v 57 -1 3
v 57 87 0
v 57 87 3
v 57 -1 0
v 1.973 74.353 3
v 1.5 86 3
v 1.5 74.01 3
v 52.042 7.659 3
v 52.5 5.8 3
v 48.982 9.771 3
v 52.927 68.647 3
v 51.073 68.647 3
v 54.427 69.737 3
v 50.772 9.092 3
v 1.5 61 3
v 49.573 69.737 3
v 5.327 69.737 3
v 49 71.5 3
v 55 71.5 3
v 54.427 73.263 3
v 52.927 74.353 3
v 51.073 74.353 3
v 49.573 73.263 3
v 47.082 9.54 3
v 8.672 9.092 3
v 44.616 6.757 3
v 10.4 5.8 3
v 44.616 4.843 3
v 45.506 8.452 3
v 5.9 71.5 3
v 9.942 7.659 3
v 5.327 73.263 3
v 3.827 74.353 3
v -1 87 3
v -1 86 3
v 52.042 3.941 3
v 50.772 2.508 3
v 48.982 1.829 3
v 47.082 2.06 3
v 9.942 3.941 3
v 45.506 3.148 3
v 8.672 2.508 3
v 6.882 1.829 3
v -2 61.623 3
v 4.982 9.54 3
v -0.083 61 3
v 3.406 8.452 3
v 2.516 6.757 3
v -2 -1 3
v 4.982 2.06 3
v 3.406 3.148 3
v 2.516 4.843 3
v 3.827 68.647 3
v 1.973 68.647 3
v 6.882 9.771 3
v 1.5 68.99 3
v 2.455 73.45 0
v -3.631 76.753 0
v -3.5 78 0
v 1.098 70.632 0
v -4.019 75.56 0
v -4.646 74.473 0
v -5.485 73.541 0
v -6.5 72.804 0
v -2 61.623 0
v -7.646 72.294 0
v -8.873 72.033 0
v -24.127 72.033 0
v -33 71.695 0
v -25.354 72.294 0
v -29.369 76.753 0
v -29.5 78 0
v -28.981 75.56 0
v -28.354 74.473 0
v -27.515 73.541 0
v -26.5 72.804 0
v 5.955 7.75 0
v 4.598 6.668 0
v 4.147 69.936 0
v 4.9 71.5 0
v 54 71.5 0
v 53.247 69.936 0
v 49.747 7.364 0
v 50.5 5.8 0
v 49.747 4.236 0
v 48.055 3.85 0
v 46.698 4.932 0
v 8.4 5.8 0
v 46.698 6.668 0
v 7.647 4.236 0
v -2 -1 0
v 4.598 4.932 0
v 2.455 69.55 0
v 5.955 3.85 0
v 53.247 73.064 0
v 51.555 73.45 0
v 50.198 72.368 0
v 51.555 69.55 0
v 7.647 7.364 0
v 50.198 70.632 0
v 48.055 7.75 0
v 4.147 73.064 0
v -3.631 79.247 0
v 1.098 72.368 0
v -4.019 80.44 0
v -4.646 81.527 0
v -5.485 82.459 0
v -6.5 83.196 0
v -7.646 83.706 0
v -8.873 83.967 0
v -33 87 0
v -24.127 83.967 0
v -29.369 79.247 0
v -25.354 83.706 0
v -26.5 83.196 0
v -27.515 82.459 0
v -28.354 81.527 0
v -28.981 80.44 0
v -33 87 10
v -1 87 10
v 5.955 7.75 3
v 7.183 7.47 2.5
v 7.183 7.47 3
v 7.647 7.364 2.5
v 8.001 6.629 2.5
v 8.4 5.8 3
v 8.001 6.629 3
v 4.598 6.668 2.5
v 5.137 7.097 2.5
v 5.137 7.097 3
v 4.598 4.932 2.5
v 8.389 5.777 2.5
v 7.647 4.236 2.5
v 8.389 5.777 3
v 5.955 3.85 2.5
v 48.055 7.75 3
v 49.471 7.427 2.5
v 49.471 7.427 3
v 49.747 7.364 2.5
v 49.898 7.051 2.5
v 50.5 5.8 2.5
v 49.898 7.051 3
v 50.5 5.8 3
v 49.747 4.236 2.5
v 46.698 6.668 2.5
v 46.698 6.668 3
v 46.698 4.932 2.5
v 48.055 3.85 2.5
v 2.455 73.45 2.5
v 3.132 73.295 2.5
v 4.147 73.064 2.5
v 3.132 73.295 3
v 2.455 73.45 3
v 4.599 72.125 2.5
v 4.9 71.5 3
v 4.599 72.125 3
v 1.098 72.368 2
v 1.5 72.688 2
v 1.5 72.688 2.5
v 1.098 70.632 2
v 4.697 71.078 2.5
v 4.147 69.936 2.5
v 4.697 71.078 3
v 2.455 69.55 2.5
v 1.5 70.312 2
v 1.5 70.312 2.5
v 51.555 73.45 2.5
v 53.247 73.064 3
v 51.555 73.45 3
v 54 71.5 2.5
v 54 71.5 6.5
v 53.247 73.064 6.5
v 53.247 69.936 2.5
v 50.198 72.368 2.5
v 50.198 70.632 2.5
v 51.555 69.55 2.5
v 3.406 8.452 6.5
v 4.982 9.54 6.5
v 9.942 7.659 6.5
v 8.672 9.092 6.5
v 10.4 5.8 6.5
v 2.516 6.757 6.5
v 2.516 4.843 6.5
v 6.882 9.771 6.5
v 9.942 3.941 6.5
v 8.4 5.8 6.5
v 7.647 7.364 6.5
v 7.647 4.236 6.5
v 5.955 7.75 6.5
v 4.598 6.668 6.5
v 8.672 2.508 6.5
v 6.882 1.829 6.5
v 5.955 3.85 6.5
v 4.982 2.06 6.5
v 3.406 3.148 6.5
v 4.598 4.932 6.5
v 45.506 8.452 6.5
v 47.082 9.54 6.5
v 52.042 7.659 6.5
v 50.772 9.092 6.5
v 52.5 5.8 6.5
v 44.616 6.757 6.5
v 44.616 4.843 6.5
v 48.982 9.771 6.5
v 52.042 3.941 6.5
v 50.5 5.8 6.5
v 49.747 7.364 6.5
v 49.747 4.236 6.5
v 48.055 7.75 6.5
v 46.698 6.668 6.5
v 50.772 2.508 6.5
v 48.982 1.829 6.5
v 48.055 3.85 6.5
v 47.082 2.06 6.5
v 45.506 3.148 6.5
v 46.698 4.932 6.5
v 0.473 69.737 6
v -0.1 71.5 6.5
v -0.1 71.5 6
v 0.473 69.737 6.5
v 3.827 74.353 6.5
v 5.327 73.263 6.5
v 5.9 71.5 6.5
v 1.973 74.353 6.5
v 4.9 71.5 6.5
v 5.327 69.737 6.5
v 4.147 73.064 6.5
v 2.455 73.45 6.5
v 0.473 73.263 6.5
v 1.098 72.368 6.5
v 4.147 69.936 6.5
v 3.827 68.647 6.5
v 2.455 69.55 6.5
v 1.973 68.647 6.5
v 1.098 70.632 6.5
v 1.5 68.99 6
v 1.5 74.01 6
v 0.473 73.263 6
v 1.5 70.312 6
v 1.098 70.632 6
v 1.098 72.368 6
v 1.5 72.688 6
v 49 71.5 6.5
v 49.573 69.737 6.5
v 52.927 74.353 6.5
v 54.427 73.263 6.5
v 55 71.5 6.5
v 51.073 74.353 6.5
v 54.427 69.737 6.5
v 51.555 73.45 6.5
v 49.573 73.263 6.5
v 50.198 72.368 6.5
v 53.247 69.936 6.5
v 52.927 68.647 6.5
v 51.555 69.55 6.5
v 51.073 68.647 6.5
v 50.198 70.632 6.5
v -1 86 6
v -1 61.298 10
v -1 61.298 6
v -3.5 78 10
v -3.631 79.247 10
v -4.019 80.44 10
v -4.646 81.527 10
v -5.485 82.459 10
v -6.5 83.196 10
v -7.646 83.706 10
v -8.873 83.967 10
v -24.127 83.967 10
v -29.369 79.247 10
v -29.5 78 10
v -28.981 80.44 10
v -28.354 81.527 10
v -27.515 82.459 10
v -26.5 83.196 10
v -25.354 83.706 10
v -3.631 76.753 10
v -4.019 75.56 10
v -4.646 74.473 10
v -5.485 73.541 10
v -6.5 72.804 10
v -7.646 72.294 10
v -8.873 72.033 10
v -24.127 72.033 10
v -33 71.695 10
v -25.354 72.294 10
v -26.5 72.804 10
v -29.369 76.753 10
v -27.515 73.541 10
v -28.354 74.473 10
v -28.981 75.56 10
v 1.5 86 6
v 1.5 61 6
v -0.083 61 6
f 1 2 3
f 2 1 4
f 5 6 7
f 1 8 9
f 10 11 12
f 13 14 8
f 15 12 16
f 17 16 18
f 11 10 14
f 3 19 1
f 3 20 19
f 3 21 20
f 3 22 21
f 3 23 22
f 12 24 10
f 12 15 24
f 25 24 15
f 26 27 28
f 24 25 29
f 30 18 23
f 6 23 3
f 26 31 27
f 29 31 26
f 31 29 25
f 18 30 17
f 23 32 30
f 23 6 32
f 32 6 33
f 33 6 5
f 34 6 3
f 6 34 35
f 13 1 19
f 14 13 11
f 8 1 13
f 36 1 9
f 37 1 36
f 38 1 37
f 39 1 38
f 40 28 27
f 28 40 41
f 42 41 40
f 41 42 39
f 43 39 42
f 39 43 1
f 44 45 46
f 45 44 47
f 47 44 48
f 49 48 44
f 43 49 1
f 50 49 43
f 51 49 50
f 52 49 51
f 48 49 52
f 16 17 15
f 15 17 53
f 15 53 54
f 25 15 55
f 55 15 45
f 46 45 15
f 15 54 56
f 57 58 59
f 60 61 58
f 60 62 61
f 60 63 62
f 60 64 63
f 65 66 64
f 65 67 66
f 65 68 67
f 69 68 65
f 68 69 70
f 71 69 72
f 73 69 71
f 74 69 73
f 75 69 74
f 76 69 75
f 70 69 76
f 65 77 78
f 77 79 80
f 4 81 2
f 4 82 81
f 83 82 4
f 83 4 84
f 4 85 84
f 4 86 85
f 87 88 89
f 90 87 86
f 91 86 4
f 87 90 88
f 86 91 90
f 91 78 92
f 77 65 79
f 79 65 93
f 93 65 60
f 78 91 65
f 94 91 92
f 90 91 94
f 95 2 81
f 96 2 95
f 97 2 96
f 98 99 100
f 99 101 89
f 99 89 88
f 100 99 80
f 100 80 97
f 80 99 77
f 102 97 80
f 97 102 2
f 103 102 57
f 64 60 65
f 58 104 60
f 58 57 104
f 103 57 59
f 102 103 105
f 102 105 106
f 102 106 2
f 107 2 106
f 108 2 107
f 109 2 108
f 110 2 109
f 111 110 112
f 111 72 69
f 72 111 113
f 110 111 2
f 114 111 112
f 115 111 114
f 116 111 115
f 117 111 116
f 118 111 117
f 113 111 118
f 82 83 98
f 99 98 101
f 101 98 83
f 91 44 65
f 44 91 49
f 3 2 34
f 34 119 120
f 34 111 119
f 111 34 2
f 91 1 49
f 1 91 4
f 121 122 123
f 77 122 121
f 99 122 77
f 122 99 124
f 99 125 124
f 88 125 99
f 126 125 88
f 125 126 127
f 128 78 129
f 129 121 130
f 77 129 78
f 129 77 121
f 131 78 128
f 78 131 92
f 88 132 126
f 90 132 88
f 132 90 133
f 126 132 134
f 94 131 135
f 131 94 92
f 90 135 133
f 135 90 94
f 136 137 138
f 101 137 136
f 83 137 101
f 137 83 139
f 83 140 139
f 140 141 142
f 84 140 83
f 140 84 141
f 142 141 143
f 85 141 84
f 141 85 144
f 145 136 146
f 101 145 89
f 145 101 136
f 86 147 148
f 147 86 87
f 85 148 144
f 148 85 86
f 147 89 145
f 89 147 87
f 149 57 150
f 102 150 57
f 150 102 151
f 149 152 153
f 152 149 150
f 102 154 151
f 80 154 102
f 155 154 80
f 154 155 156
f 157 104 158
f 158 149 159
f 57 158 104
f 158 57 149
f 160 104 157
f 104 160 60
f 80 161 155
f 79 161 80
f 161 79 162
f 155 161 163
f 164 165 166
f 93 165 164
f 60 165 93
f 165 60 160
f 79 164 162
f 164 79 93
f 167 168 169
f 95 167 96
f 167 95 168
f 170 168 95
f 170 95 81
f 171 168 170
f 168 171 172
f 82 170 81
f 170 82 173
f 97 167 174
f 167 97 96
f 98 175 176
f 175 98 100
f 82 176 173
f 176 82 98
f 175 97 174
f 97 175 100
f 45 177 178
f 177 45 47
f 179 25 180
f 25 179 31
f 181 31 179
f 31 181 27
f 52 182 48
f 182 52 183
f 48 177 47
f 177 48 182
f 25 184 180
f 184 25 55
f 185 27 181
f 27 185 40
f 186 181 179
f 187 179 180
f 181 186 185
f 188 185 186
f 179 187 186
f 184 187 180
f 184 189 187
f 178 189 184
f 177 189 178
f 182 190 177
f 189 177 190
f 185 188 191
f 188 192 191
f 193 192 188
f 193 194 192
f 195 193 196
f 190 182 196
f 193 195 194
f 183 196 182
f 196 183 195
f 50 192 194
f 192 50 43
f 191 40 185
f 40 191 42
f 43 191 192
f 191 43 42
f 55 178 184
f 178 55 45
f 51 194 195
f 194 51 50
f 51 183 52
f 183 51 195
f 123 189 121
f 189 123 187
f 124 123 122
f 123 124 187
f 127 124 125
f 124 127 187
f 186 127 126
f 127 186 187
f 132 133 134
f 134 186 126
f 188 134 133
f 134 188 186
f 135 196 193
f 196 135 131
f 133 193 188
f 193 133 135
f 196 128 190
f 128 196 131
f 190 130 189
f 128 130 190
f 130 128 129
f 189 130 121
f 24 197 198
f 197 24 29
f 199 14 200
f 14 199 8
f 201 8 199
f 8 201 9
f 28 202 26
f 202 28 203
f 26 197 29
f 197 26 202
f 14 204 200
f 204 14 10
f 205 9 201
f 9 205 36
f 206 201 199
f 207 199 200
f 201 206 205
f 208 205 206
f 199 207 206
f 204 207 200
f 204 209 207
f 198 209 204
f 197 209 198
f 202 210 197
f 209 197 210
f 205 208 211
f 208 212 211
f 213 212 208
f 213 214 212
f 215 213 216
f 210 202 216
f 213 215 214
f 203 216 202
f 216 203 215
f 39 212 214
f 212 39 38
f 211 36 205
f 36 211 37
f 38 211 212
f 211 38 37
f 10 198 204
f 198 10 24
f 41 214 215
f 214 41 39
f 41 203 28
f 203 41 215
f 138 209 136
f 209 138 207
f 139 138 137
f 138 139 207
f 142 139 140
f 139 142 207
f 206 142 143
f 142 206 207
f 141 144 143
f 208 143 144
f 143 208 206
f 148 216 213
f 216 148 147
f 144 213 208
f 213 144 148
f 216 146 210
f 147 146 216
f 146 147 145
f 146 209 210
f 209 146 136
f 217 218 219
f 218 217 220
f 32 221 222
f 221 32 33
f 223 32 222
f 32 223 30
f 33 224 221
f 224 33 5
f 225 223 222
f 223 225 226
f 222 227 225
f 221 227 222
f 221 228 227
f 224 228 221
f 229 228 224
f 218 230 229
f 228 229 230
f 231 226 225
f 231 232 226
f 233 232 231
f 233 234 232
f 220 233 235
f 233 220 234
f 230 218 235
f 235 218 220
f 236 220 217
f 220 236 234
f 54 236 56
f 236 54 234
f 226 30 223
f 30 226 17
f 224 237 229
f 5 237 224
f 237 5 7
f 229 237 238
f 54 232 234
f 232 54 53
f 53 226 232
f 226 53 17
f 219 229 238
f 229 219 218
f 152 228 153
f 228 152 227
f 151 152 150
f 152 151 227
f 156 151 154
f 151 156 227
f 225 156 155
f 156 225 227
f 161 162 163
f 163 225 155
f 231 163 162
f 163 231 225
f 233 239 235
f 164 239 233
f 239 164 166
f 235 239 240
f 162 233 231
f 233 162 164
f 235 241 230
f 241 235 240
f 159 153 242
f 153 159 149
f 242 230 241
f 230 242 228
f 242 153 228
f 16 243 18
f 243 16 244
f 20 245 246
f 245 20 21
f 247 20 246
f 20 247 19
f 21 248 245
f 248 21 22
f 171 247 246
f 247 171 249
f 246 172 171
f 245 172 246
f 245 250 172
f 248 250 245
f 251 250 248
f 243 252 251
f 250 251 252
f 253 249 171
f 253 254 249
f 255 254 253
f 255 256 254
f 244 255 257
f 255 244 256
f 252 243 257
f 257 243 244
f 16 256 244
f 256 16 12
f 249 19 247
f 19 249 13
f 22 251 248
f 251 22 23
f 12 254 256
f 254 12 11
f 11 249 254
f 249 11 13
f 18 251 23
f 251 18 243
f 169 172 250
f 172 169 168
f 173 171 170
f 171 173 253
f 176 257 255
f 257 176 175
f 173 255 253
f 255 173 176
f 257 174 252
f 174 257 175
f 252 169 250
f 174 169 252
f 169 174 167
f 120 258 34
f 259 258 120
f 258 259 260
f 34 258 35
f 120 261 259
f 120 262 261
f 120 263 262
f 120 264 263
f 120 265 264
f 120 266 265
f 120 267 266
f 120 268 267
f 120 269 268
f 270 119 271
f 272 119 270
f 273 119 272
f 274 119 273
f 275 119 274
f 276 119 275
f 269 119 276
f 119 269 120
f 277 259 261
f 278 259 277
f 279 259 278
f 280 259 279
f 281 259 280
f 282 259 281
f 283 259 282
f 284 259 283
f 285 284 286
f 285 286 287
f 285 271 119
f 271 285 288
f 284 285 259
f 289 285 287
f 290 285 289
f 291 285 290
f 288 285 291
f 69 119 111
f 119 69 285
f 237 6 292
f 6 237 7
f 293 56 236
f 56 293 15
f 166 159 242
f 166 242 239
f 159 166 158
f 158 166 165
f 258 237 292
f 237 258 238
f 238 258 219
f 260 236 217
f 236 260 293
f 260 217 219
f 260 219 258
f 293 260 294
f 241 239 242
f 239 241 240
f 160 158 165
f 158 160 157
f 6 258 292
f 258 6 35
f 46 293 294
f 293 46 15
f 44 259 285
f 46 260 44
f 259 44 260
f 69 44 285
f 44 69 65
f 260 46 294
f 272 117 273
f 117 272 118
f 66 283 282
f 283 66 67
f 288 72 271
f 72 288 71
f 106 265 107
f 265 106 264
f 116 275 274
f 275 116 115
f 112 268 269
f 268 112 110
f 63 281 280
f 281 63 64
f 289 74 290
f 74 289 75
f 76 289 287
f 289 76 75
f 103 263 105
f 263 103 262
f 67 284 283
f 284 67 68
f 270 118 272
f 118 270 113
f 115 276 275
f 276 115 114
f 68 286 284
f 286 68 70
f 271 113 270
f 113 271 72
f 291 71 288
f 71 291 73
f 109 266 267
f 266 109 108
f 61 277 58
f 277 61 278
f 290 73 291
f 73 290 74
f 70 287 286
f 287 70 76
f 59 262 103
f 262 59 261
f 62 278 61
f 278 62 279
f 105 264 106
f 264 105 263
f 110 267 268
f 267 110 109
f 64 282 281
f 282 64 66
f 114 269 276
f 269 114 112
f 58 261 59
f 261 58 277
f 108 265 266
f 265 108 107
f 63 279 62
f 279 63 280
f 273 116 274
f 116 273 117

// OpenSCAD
//translate(v = [0,0,1]) color("blue") import("HolderOpenROVCleanFixed.stl");
beagleboard();


module beagleboard() {
	union() {
		difference() {
			translate(v = [-2,-1,0]) cube(size = [59,88,3]);

			// Bolt Holes
			translate(v = [6.4,5.8,-3]) cylinder(r = 2, h = 10);
			translate(v = [48.5,5.8,-3]) cylinder(r = 2, h = 10);
			translate(v = [2.9,71.5,-3]) cylinder(r = 2, h = 10);
			translate(v = [52,71.5,-3]) cylinder(r = 2, h = 10);
		}
		// Risers
		translate(v = [6.4,5.8,2.5]) riser(4);
		translate(v = [48.5,5.8,2.5]) riser(4);
		translate(v = [2.9,71.5,2.5]) riser(3);
		translate(v = [52,71.5,2.5]) riser(3);

	
		// Camera Holder
		translate(v = [-1,0,0]) difference() {
			union() {
				translate(v = [-32,59,0]) cube(size = [32,28,10]); // h = 25
				// Extra Camera Support
				translate(v = [-1.5,61,2]) cube(size = [4,25,4]);
			}
			translate(v = [-50,46,-5]) rotate(a = [0,0,-18]) cube(size = [50,30,48]);
			translate(v = [0,0,-1]) hull() {
				translate(v = [-22.5,78,0]) cylinder(r = 6, h = 50, $fn=30);
				translate(v = [-8.5,78,0]) cylinder(r = 6, h = 50, $fn=30);
			}
		}


	}
}


module riser(rad) {
	difference() {
		cylinder(r = rad, h = 4);
		translate(v = [0,0,-5]) cylinder(r = 2, h = 16);
	}
}
